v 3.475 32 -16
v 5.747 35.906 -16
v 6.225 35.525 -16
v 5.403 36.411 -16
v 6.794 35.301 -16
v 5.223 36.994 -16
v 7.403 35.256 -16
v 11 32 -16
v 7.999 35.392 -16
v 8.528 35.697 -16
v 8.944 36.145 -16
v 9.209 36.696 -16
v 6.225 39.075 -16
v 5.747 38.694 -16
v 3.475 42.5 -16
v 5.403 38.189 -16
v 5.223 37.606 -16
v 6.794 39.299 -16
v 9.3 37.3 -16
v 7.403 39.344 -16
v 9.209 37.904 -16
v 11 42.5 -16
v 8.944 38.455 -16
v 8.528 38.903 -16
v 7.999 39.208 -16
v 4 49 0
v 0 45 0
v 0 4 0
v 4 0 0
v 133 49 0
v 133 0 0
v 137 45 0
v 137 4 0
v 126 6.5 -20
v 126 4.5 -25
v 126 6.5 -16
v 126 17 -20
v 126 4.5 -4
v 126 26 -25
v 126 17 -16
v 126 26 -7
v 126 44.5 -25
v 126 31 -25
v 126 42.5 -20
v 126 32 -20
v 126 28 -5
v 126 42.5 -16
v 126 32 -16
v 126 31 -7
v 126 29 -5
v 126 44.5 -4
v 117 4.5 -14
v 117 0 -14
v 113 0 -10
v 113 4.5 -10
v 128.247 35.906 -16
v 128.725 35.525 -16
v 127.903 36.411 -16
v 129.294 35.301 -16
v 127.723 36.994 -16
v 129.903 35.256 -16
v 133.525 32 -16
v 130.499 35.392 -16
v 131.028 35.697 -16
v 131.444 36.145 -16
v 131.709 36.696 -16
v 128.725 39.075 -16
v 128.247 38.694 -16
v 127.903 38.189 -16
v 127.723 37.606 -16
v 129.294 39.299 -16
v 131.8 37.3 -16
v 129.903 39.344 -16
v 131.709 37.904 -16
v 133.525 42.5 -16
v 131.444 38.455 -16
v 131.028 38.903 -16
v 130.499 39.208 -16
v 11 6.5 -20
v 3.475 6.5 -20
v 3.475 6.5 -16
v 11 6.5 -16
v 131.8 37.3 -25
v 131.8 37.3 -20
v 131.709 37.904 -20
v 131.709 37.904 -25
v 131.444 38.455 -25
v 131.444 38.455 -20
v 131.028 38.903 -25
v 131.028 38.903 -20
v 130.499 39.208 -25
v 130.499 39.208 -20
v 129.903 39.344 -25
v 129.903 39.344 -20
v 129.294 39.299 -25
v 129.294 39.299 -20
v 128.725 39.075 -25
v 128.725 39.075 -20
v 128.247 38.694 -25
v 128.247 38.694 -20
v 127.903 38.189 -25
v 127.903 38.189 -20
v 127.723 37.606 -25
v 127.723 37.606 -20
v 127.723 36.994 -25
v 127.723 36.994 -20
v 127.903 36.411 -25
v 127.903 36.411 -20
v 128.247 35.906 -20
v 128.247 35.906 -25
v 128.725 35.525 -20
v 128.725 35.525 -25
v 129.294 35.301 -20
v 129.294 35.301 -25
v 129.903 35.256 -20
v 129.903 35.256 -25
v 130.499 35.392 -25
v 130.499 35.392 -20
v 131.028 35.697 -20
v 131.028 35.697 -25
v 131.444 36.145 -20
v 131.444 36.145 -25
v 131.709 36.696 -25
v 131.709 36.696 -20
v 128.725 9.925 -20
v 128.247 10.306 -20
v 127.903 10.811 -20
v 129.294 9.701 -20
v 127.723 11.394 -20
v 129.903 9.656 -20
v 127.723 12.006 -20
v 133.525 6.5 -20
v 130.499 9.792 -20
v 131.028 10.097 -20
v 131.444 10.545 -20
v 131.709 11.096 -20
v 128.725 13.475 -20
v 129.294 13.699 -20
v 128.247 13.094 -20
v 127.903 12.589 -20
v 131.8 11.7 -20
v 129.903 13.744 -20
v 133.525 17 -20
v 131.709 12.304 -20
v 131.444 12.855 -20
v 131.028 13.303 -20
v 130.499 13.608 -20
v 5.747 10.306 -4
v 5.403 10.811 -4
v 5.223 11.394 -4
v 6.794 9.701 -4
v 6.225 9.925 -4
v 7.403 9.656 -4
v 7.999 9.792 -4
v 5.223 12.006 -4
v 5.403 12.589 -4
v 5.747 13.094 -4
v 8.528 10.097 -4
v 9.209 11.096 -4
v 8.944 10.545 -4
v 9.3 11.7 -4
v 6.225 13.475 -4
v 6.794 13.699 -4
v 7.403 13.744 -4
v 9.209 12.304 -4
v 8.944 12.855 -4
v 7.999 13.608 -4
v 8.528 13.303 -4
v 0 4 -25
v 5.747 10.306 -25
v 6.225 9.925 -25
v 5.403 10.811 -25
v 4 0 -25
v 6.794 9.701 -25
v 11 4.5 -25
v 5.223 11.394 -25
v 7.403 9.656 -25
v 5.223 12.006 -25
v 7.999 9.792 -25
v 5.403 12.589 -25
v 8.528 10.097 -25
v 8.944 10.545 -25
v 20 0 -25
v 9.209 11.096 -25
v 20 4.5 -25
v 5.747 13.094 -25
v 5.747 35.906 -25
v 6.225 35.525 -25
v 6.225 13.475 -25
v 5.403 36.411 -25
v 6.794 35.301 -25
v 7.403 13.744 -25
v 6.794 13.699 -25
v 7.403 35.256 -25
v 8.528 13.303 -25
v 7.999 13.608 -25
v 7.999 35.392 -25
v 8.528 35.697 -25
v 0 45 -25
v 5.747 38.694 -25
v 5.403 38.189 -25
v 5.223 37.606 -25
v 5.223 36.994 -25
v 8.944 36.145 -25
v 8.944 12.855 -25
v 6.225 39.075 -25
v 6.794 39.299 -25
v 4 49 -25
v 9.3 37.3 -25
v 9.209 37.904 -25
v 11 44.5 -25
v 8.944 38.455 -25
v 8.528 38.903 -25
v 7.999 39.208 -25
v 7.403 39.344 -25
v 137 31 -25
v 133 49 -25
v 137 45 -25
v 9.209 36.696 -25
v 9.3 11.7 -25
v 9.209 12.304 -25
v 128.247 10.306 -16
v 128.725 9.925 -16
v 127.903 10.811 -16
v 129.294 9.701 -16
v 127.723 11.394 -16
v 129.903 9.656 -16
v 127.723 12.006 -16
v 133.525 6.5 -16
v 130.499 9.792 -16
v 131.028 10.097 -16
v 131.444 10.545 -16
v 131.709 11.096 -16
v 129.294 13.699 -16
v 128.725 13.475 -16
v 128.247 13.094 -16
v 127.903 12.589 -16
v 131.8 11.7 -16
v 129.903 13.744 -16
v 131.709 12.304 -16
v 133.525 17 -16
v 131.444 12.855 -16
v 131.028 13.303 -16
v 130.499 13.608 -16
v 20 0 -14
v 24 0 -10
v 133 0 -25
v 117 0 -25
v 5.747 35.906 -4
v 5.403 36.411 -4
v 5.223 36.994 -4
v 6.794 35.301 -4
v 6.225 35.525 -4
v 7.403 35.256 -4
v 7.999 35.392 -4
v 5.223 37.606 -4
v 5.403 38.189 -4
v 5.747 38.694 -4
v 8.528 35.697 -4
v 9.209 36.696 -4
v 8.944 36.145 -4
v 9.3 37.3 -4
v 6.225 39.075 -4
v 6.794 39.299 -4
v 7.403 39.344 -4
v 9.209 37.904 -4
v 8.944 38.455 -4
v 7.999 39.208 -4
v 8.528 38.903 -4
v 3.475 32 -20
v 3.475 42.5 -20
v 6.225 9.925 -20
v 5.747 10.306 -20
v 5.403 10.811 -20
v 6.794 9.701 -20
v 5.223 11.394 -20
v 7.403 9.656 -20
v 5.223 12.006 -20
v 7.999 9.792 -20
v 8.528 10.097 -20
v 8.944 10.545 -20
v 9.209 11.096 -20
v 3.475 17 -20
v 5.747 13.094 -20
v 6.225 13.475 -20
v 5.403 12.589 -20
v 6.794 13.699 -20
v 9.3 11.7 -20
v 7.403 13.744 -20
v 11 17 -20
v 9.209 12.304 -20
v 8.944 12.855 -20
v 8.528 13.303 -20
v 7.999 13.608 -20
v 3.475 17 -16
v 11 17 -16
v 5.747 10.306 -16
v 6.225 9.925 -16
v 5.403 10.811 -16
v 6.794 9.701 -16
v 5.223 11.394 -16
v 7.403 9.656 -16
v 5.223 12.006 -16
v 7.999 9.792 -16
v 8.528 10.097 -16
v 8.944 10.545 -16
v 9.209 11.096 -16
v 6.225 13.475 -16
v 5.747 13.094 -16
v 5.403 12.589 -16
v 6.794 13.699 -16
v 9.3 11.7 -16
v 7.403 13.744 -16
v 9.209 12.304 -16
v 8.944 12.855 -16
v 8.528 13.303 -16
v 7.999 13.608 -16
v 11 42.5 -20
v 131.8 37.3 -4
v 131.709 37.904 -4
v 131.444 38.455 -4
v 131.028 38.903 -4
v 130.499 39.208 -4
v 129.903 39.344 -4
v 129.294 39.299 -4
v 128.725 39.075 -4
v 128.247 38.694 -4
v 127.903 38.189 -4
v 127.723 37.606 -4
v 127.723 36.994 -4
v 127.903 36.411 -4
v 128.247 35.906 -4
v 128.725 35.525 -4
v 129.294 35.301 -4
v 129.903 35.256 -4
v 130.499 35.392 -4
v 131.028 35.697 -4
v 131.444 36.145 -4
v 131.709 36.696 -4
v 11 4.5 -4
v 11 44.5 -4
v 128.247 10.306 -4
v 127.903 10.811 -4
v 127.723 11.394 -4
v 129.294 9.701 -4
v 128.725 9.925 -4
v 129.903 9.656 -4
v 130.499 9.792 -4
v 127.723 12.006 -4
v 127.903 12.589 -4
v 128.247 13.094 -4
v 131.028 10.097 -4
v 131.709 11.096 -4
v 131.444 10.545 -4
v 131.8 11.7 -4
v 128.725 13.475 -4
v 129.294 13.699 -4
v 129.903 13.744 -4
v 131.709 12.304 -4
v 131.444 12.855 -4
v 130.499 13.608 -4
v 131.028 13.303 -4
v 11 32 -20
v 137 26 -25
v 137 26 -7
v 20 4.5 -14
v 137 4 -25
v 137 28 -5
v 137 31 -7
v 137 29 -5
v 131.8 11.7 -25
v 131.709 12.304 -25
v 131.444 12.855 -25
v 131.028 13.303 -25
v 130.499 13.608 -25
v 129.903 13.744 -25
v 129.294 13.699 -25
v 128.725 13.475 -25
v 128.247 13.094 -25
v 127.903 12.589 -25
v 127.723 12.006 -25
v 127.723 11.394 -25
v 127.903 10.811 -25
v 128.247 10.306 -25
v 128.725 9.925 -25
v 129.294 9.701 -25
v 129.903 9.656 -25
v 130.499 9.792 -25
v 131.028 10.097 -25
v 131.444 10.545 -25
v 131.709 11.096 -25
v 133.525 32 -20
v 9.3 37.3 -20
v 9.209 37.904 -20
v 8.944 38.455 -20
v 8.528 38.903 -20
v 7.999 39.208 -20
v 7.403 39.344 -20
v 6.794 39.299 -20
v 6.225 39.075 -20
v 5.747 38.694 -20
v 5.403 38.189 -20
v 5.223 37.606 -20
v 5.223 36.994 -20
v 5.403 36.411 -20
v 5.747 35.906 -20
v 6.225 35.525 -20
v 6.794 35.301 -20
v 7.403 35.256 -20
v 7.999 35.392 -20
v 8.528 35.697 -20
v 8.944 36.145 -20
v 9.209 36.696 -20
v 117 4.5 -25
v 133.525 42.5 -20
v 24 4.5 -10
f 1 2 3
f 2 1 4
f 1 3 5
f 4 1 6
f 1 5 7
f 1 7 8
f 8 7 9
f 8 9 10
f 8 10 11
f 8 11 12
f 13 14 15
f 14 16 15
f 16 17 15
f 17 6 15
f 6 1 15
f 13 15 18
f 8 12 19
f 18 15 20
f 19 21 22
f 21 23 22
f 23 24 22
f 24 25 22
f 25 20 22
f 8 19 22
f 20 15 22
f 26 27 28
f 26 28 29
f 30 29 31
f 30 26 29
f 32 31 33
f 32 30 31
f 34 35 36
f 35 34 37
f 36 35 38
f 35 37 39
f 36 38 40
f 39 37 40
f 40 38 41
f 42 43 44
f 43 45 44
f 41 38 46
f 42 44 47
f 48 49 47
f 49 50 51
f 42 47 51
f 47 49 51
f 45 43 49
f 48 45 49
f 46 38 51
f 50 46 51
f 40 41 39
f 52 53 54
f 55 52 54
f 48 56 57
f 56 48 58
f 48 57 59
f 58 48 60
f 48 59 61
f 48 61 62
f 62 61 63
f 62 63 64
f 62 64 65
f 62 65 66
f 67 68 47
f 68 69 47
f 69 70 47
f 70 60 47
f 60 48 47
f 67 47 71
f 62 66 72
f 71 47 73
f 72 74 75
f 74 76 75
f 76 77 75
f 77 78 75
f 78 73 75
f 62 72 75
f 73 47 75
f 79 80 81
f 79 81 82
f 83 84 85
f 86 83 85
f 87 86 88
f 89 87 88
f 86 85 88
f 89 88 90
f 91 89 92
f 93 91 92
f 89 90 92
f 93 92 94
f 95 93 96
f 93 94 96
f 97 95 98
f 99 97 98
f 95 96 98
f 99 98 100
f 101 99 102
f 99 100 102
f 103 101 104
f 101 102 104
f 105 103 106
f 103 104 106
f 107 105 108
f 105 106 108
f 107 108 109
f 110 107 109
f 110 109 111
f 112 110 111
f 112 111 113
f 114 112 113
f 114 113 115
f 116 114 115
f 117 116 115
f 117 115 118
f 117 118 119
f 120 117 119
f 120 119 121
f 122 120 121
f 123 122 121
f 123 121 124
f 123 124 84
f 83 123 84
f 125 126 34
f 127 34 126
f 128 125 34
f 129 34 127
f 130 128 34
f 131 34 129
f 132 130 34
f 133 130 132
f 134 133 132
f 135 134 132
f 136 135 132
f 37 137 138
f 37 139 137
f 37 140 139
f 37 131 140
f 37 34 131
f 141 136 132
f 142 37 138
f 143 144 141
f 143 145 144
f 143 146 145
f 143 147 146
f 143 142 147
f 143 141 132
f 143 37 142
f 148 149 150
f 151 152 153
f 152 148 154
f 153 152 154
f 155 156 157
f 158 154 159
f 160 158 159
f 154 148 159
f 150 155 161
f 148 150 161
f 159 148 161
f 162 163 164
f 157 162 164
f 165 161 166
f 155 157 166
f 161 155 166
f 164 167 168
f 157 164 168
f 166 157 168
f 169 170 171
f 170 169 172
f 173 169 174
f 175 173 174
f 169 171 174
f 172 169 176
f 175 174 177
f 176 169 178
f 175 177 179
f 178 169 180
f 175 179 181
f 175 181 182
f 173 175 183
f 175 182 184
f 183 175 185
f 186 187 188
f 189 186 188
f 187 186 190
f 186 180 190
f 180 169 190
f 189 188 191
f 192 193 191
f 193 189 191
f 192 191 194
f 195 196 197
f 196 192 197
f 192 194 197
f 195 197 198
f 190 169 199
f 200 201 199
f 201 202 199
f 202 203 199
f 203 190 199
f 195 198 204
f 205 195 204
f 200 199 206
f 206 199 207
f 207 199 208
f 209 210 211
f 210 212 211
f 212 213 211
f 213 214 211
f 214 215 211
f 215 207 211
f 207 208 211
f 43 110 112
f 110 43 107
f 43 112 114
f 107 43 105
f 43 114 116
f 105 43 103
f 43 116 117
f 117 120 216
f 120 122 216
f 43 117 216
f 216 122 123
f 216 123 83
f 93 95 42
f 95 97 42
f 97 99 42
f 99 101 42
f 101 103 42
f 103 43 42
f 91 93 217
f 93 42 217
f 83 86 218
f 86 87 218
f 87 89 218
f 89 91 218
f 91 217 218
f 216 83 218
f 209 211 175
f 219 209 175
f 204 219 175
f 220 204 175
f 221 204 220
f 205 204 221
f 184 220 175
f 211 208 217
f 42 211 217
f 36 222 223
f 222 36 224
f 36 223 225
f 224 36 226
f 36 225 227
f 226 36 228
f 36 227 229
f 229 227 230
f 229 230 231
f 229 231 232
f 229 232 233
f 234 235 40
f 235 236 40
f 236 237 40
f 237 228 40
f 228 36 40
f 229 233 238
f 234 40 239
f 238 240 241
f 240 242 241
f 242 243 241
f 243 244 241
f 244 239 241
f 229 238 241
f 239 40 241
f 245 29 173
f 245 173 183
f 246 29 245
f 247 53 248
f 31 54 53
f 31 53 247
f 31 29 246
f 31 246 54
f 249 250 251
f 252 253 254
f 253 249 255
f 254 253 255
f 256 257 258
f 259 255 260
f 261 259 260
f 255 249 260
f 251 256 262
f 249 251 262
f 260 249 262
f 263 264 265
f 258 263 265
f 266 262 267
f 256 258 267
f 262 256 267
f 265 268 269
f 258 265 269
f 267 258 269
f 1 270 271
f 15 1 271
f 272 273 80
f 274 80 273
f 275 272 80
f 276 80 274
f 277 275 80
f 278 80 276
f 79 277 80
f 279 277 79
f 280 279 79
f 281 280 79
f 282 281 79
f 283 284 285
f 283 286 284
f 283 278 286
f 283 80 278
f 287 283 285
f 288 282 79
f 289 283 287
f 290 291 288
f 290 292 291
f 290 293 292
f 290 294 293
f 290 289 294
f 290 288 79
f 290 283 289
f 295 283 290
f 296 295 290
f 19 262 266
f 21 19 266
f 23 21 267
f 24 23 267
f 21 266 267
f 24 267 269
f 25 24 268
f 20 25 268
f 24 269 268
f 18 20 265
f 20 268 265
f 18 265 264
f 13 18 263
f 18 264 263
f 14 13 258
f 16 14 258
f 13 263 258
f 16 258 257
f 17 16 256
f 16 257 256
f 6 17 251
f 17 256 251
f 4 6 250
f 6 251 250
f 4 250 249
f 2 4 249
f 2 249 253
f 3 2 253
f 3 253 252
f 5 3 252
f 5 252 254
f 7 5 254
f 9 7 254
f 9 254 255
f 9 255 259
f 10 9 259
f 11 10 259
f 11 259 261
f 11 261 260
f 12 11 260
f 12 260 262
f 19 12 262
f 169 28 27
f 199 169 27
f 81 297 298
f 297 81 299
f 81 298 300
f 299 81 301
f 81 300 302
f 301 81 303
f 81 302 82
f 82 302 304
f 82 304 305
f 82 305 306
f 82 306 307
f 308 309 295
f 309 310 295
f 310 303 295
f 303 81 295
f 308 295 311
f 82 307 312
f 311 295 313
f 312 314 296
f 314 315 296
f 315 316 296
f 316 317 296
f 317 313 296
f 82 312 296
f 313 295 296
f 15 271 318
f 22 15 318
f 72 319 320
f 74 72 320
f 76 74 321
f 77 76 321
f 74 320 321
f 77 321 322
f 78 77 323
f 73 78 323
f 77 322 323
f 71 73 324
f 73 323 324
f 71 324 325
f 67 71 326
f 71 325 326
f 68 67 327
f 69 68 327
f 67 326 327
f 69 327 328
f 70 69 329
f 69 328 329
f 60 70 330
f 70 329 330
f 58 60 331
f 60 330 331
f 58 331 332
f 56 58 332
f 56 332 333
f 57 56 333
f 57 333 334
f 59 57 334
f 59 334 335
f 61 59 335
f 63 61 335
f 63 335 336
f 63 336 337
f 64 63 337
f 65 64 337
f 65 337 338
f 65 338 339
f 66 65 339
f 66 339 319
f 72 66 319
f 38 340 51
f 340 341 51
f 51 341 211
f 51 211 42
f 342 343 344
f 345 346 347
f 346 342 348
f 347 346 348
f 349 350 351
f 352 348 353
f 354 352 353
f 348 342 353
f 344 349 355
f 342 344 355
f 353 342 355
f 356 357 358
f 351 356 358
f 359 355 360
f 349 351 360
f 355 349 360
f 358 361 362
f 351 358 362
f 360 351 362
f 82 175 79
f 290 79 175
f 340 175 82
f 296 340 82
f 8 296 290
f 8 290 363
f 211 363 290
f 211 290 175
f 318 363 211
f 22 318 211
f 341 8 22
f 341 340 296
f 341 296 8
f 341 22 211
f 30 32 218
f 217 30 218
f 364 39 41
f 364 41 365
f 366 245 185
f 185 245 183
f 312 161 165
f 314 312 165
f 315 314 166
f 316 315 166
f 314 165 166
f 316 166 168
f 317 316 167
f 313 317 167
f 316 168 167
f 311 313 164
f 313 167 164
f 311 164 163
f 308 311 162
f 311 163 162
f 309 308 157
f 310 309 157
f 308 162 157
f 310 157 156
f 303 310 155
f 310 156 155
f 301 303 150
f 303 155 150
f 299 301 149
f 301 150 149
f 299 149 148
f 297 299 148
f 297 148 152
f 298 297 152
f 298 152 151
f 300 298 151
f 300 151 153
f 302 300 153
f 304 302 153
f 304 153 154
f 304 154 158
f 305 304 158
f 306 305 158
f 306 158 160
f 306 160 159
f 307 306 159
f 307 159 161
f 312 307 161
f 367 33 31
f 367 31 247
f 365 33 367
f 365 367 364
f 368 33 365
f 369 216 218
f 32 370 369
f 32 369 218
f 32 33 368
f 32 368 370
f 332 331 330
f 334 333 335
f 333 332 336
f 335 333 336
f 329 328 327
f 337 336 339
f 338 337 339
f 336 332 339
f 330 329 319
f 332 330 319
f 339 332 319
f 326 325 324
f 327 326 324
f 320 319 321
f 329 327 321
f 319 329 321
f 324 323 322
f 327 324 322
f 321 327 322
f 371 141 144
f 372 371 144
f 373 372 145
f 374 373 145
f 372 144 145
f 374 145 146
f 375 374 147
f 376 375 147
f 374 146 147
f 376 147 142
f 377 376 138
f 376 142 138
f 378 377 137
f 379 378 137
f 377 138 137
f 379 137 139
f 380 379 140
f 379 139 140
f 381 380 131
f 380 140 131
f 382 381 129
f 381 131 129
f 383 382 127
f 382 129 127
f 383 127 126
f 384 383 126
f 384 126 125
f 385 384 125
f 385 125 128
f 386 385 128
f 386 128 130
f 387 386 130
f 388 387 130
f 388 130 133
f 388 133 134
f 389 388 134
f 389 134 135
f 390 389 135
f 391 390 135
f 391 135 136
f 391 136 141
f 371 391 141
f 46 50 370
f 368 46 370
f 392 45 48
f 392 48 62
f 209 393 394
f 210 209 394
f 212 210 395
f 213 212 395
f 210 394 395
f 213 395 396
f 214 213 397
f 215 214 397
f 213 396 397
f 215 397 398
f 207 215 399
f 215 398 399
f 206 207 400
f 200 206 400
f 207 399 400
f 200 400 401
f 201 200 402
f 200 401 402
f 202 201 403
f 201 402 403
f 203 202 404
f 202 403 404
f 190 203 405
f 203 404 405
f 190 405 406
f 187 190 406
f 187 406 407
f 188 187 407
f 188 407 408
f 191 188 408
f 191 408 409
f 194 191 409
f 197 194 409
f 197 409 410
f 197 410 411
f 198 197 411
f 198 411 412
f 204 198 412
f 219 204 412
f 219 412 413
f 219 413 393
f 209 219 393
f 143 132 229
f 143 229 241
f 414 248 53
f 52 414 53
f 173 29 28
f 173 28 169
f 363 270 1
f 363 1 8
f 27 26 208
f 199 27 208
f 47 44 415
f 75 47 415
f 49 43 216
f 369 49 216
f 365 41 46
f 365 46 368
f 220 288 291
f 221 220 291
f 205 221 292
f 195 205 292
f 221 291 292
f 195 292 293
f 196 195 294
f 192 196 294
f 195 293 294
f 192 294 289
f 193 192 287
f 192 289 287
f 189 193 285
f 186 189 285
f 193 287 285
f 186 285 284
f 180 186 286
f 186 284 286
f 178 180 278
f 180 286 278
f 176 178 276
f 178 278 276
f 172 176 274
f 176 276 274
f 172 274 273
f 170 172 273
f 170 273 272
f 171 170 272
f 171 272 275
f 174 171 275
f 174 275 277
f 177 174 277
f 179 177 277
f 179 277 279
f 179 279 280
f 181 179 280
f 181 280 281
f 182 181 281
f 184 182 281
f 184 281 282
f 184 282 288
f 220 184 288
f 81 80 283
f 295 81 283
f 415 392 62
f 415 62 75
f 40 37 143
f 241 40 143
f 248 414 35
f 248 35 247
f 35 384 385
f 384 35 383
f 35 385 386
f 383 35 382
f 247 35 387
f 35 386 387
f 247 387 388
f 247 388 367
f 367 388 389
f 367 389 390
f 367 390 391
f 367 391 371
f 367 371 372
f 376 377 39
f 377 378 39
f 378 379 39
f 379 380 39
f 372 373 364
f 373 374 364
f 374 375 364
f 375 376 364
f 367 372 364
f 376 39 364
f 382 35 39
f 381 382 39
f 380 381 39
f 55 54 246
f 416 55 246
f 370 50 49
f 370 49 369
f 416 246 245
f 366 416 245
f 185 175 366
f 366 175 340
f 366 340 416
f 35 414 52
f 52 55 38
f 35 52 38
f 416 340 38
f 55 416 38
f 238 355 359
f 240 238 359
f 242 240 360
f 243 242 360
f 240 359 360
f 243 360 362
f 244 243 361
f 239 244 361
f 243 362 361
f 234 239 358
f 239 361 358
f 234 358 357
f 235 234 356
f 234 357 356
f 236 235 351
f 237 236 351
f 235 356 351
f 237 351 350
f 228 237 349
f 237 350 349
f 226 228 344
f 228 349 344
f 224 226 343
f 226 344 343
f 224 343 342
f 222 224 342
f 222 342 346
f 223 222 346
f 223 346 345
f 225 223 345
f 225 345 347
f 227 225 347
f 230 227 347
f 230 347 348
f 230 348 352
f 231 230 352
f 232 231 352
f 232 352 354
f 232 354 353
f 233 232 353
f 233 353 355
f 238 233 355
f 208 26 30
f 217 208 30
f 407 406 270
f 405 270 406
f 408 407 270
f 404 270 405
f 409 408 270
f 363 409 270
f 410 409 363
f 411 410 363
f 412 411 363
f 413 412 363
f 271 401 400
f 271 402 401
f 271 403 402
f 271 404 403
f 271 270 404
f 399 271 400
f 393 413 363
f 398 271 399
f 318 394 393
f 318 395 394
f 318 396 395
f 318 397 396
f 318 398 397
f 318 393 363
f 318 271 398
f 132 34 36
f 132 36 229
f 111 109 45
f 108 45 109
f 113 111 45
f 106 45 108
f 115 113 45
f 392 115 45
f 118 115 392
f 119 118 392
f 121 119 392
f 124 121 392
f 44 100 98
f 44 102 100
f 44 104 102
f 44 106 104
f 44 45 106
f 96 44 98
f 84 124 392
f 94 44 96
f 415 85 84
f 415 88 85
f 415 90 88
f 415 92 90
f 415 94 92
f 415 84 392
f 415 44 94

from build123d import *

# Parameters (mm, degrees)
SKETCH_W        = 137
SKETCH_H        = 49
SKETCH_R        = 2.05
SKETCH_W_2      = 115
SKETCH_H_2      = 40
PAD_DEPTH       = 25
CHAMFER_SIZE    = 4
SKETCH004_W     = 129
SKETCH004_H     = 41
PAD001_DEPTH    = 4
SKETCH003_W     = 7.55
SKETCH003_H     = 10.5
POCKET_DEPTH    = 4
POCKET001_DEPTH = 5.01
SKETCH005_W     = 22.132821
SKETCH005_H     = 5
POCKET002_DEPTH = 15
CHAMFER001_SIZE = 2


with BuildPart() as part:
    # Sketch → Pad (new body)
    with BuildSketch(Plane.XY):
        with Locations((68.5, 24.5)):
            Rectangle(SKETCH_W, SKETCH_H)
        with Locations((7.25, 11.7)):
            Circle(SKETCH_R, mode=Mode.SUBTRACT)
        with Locations((129.75, 11.7)):
            Circle(SKETCH_R, mode=Mode.SUBTRACT)
        with Locations((7.25, 37.3)):
            Circle(SKETCH_R, mode=Mode.SUBTRACT)
        with Locations((129.75, 37.3)):
            Circle(SKETCH_R, mode=Mode.SUBTRACT)
        with Locations((68.5, 24.5)):
            Rectangle(SKETCH_W_2, SKETCH_H_2, mode=Mode.SUBTRACT)
    extrude(amount=-PAD_DEPTH)

    # Chamfer
    chamfer_edges = [part.edges().sort_by_distance(p)[0] for p in [
        (137, 49, -12.5),
        (137, 0, -12.5),
        (0, 49, -12.5),
        (0, 0, -12.5),
    ]]
    chamfer(chamfer_edges, length=CHAMFER_SIZE)

    # Sketch004 → Pad001 (join)
    with BuildSketch(Plane.XY):
        with Locations((68.5, 24.5)):
            Rectangle(SKETCH004_W, SKETCH004_H)
    extrude(amount=-PAD001_DEPTH)

    # Sketch003 (on DatumPlane) → Pocket (cut)
    with BuildSketch(Plane.XY.offset(-20)):
        with Locations((7.25, 11.75)):
            Rectangle(SKETCH003_W, SKETCH003_H)
        with Locations((7.25, 37.25)):
            Rectangle(SKETCH003_W, SKETCH003_H)
        with Locations((129.75, 37.25)):
            Rectangle(SKETCH003_W, SKETCH003_H)
        with Locations((129.75, 11.75)):
            Rectangle(SKETCH003_W, SKETCH003_H)
    extrude(amount=POCKET_DEPTH, mode=Mode.SUBTRACT)

    # Sketch002 → Pocket001 (cut)
    with BuildSketch(Plane.XZ):
        Polygon((113, -10), (24, -10), (20, -14), (20, -147.795874), (117, -147.795874), (117, -14), align=None)
    extrude(amount=-POCKET001_DEPTH, mode=Mode.SUBTRACT)

    # Sketch005 (on DatumPlane) → Pocket002 (cut, symmetric)
    with BuildSketch(Plane.XY.offset(-20)):
        with Locations((131.19064, 28.5)):
            Rectangle(SKETCH005_W, SKETCH005_H)
    extrude(amount=POCKET002_DEPTH, both=True, mode=Mode.SUBTRACT)

    # Chamfer001
    chamfer001_edges = [part.edges().sort_by_distance(p)[0] for p in [
        (131.5, 26, -5),
        (131.5, 31, -5),
    ]]
    chamfer(chamfer001_edges, length=CHAMFER001_SIZE)


solid = part.part
